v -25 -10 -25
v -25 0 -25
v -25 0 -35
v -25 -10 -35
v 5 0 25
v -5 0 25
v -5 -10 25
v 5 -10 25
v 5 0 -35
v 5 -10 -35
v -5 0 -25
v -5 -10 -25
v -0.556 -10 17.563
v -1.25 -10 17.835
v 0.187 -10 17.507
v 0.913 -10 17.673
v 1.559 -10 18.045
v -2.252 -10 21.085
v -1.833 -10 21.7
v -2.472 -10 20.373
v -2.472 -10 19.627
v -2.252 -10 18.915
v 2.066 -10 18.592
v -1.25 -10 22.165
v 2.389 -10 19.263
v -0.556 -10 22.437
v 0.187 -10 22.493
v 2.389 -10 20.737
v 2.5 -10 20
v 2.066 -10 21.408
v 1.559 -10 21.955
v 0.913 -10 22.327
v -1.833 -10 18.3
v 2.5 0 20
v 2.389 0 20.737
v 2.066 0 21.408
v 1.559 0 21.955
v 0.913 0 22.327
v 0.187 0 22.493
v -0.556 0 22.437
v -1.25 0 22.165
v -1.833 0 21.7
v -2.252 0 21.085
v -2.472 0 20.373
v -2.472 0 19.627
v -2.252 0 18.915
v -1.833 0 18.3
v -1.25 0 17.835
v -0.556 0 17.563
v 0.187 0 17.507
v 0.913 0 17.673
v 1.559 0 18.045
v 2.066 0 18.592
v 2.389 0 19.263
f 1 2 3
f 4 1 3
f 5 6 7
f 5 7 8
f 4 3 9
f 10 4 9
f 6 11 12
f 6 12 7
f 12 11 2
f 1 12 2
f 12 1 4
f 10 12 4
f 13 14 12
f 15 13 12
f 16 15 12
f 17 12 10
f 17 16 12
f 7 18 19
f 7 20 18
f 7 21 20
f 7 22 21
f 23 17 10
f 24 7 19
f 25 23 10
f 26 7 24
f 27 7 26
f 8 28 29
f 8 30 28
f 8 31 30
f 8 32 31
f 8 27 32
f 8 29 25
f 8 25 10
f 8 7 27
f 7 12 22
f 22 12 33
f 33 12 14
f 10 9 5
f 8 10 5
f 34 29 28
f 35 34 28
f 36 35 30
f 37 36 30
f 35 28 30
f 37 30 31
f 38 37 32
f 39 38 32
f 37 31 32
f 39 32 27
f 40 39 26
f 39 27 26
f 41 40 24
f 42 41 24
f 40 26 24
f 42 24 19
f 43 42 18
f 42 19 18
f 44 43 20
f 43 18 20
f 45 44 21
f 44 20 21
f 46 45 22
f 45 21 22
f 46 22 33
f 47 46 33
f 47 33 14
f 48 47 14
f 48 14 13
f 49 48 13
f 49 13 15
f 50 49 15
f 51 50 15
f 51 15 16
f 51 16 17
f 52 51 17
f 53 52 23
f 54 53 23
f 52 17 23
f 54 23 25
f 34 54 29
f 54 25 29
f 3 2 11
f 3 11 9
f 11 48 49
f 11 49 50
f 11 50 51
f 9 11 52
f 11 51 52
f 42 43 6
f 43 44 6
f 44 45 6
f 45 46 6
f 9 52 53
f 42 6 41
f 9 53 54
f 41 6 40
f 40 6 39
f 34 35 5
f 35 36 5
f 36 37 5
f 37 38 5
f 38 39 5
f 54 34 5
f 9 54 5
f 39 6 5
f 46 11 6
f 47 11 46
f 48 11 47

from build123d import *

# Parameters (mm, degrees)
F0_W     = 10
F0_H     = 50
F1_DEPTH = 10
F2_R     = 2.5
F3_DEPTH = 10


with BuildPart() as f1:
    # F0 (on Front) → F1 (new body)
    with BuildSketch(Plane.XZ):
        Rectangle(F0_W, F0_H)
        Polygon((5, -35), (5, -25), (-5, -25), (-25, -25), (-25, -35), align=None)
    extrude(amount=F1_DEPTH)

    # F2 (on face) → F3 (cut, through all)
    with BuildSketch(Plane.XZ.offset(10)):
        with Locations((0, 20)):
            Circle(F2_R)
    extrude(amount=-F3_DEPTH, mode=Mode.SUBTRACT)


solid = f1.part
